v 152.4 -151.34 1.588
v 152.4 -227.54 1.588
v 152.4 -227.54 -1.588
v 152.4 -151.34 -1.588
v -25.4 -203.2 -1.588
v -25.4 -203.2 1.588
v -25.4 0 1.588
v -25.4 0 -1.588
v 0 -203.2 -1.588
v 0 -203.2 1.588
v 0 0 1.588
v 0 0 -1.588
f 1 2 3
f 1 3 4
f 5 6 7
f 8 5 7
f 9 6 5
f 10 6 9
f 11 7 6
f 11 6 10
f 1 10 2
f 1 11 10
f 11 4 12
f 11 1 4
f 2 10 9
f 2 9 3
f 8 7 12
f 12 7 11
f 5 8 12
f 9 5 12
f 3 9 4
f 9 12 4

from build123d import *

# Parameters (mm, degrees)
SKETCH1_W           = 25.4
SKETCH1_H           = 203.2
BOSS_EXTRUDE1_DEPTH = 1.5875


with BuildPart() as part:
    # Sketch1 → Boss-Extrude1 (new body, symmetric)
    with BuildSketch(Plane.XY):
        with Locations((-12.7, -101.6)):
            Rectangle(SKETCH1_W, SKETCH1_H)
        Polygon((152.4, -227.539743973), (152.4, -151.339743973), (0, 0), (0, -203.2), align=None)
    extrude(amount=BOSS_EXTRUDE1_DEPTH, both=True)


solid = part.part
